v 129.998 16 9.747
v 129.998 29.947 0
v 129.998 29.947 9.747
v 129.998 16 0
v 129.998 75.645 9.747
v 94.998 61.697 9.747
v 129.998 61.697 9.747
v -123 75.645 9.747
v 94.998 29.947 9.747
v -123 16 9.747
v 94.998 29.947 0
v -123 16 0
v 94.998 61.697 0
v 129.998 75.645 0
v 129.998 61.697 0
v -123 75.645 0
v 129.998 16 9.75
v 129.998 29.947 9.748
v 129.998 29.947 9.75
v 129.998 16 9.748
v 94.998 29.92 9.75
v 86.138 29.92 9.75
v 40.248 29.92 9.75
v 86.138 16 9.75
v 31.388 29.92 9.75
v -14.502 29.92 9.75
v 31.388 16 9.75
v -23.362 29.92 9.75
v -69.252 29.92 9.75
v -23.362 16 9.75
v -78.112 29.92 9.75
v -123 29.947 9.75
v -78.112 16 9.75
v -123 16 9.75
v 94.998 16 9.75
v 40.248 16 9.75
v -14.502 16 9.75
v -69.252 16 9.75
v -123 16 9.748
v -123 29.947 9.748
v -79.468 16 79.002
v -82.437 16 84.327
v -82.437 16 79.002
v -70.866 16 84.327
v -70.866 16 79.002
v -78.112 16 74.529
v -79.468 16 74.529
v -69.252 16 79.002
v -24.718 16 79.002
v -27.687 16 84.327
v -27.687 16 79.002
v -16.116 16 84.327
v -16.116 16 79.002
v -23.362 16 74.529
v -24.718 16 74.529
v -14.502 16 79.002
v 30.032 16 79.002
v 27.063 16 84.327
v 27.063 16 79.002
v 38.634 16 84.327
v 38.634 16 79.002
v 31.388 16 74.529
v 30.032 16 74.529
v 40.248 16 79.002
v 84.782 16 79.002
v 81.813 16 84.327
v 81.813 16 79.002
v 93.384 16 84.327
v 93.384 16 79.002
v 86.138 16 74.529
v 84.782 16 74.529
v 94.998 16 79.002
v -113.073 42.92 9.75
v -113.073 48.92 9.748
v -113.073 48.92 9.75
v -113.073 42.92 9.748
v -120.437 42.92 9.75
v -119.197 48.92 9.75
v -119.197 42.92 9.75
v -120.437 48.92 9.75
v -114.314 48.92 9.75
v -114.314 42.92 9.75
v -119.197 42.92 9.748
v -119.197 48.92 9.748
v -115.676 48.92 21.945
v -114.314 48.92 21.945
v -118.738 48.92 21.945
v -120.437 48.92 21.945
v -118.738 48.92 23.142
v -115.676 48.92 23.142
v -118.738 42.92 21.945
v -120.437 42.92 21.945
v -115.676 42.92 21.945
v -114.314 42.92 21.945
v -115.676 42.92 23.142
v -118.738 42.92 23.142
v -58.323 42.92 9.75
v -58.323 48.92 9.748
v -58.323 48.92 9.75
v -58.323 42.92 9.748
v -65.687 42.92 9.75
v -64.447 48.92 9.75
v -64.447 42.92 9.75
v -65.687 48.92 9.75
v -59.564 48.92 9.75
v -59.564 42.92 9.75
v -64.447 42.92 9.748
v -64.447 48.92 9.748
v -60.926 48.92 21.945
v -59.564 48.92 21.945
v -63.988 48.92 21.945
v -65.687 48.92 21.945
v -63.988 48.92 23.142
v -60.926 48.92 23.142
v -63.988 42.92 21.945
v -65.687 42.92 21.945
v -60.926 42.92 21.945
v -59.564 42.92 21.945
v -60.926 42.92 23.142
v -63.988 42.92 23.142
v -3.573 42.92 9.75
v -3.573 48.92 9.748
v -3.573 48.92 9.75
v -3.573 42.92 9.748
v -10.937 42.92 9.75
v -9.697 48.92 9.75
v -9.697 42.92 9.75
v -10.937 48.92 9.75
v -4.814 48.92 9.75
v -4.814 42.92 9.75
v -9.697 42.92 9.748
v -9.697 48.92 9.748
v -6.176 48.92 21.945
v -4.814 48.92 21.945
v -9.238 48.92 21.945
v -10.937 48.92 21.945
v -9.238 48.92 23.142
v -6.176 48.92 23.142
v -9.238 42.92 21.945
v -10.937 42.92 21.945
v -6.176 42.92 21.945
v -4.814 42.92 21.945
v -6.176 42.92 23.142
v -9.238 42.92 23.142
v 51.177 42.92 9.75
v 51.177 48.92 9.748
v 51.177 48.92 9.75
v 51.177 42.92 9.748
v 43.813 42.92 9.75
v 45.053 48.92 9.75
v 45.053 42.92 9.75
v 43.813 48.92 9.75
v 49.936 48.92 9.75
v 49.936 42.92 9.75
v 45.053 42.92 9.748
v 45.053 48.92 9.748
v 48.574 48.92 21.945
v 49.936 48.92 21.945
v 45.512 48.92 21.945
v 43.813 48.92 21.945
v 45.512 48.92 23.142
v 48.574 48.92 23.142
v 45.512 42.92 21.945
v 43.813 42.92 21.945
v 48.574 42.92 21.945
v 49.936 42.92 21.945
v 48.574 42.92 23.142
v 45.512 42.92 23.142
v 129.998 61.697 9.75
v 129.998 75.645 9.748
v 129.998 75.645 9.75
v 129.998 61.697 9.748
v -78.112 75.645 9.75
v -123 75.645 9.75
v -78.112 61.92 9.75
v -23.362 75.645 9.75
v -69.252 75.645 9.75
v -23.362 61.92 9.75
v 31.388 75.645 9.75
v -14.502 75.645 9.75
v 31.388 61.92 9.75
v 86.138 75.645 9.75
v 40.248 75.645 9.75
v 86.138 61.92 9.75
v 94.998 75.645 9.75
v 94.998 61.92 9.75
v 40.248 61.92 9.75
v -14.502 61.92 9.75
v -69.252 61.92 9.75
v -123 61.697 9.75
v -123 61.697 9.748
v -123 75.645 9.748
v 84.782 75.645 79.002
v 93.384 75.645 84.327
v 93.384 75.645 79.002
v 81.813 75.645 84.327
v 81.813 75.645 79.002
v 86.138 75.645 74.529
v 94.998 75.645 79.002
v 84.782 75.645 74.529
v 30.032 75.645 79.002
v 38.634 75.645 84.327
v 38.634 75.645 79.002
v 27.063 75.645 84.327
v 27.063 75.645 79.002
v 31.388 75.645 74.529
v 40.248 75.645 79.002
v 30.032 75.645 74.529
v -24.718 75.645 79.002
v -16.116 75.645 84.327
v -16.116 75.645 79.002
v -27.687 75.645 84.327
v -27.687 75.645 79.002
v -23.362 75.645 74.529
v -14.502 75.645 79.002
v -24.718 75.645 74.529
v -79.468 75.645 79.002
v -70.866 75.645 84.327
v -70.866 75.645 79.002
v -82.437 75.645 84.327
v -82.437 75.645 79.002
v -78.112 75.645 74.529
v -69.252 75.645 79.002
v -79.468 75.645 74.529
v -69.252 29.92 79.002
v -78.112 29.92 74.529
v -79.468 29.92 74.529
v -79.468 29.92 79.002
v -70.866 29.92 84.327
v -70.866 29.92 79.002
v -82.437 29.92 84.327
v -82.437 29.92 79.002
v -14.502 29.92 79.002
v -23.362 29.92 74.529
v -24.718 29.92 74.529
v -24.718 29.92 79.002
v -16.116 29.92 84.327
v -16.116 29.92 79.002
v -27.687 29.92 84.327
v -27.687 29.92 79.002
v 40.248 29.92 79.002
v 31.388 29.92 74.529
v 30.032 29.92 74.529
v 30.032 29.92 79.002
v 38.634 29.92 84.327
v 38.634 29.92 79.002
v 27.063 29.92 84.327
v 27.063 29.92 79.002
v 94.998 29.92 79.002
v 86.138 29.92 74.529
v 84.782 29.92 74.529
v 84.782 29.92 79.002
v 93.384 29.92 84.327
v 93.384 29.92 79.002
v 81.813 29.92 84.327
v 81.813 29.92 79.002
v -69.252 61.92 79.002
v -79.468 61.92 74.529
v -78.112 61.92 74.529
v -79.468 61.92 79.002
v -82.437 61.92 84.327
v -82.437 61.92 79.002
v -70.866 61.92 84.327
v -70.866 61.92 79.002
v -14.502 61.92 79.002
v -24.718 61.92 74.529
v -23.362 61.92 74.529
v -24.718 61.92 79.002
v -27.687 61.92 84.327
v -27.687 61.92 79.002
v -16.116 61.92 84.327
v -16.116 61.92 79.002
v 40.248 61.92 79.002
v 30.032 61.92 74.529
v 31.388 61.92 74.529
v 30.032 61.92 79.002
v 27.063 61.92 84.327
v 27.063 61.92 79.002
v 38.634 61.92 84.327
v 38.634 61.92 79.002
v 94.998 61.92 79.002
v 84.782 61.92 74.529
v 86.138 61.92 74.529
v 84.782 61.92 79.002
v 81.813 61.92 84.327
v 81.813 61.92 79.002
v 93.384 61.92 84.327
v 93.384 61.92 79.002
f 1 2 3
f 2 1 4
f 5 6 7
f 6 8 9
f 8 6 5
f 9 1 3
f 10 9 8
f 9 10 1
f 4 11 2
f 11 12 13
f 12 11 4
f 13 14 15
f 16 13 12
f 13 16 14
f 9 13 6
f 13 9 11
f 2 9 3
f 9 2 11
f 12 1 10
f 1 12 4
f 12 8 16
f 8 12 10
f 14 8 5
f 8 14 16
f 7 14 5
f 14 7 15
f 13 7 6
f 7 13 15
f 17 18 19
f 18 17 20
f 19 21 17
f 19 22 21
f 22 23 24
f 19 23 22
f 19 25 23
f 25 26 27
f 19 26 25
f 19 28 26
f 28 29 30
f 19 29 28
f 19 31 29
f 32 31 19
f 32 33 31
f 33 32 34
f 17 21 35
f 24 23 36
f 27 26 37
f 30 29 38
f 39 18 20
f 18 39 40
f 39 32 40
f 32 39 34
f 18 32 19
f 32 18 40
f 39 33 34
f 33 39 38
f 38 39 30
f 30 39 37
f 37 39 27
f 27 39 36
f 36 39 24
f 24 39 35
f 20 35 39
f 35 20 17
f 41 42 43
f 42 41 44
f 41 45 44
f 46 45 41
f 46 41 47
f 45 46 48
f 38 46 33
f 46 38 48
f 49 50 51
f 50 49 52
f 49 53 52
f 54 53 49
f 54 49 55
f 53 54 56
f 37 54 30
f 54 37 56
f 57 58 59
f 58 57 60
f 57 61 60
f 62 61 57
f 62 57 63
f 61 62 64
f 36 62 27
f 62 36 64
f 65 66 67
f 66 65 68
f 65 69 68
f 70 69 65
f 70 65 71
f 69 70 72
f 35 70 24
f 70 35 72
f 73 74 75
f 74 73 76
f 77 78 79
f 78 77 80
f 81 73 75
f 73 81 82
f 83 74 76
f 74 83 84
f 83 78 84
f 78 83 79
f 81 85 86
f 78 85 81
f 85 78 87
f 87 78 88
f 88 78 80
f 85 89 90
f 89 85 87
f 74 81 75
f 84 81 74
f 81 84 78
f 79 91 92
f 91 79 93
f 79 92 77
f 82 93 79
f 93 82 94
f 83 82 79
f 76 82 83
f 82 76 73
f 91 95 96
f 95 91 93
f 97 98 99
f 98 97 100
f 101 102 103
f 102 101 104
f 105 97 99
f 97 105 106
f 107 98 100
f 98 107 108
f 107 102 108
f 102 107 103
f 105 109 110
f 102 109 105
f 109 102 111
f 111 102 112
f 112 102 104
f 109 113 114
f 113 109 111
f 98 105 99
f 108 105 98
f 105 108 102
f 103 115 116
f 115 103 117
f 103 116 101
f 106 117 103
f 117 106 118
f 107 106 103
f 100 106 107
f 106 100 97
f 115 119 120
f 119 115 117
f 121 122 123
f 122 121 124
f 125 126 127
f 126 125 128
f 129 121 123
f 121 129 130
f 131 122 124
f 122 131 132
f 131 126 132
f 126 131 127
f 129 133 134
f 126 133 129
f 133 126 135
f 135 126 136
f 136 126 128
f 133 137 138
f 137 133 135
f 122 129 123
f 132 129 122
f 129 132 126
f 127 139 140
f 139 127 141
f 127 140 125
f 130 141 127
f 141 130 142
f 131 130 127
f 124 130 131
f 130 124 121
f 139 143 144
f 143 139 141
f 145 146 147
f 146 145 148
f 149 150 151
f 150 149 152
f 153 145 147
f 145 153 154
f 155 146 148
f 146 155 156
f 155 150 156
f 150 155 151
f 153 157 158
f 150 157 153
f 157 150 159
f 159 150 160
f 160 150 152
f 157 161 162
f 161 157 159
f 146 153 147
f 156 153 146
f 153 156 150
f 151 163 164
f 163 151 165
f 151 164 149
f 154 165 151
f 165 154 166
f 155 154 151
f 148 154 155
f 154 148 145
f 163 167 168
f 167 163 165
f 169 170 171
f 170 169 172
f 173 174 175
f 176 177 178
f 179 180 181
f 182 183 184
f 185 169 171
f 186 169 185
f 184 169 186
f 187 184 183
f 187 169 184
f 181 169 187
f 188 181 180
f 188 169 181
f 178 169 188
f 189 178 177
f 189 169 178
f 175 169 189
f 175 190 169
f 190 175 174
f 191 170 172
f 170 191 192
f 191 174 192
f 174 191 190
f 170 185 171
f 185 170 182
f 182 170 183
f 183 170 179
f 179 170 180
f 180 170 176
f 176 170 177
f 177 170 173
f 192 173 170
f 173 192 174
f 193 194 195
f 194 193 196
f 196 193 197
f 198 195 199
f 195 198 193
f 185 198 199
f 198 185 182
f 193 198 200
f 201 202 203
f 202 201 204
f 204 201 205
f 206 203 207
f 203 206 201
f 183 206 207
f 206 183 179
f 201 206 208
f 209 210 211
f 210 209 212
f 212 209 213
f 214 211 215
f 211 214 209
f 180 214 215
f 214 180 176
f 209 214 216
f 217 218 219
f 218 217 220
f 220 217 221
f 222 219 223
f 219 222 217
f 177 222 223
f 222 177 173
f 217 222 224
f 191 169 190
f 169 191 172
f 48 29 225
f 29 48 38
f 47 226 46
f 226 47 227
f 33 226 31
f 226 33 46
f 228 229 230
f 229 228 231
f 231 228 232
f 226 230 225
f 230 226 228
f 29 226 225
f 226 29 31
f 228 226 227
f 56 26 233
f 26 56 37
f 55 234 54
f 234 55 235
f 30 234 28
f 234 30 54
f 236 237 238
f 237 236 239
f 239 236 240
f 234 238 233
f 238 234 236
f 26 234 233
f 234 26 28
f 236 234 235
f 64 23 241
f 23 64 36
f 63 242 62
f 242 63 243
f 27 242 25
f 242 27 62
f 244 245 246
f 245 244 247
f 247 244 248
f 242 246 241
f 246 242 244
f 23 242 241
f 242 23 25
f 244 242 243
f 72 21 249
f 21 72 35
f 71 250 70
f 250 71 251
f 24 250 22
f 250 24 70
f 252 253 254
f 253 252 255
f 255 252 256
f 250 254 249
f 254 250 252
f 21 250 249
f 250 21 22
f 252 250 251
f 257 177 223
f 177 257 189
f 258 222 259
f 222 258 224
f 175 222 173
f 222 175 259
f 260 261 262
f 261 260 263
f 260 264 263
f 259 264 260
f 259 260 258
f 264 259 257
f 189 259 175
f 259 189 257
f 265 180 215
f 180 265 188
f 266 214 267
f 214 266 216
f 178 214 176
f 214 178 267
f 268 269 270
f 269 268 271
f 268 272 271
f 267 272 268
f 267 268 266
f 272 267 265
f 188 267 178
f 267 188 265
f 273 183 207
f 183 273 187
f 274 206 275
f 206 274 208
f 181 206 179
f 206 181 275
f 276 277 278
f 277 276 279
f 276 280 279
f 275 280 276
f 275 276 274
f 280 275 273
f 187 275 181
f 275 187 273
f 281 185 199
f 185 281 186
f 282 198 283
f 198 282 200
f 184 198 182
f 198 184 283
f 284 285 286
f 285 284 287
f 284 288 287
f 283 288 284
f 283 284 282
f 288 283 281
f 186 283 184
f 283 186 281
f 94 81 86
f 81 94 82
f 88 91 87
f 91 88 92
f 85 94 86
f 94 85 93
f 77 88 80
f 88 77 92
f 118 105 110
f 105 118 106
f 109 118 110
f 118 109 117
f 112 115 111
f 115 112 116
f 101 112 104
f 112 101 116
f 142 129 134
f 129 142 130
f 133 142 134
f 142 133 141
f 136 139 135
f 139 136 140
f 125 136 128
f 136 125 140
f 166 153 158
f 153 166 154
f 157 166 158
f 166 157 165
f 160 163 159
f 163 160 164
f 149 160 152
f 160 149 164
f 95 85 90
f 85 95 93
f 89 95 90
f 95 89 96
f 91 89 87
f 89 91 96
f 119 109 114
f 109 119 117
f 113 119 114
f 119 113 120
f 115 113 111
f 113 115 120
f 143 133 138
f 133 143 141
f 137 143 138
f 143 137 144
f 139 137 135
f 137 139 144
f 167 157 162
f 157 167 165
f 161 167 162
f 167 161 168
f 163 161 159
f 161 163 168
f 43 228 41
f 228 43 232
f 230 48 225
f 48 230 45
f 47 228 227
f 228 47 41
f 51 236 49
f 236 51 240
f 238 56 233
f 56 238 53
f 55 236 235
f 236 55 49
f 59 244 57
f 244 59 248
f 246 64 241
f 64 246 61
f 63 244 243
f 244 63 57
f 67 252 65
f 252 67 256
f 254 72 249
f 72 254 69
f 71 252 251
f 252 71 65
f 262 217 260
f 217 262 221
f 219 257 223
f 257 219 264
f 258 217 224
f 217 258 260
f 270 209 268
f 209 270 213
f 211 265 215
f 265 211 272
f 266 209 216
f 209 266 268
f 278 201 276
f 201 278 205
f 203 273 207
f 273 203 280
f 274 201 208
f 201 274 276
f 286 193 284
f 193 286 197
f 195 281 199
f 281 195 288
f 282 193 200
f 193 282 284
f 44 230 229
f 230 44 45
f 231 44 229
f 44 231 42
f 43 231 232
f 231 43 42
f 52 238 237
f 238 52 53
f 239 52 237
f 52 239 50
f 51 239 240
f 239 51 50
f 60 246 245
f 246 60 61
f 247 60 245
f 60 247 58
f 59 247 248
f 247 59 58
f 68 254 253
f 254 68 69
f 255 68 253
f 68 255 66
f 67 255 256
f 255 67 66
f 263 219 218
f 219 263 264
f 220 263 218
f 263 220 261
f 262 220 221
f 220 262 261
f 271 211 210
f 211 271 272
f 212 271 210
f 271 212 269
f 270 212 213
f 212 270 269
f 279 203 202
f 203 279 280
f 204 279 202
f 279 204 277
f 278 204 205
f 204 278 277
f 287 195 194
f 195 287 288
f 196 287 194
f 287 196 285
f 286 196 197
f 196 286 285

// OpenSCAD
// Rewritten from layered polygon rebuild into rectilinear cubes
// Each slab is decomposed into axis-aligned rectangles and emitted as cubes.
// Note: This preserves orthogonal geometry; curved/diagonal features (if any) are approximated.

module rect_prism(x1,y1,x2,y2,z0,h){
  translate([x1,y1,z0]) cube([x2-x1, y2-y1, h], center=false);
}

module slab_1() {
  union() {
    rect_prism(94.997986,15.999999,129.997986,29.946999,0,9.747);
    rect_prism(-123.000008,15.999999,94.997986,75.644997,0,9.747);
    rect_prism(94.997986,61.696999,129.997986,75.644997,0,9.747);
  }
}

module slab_2() {
  union() {
    rect_prism(-123.000008,15.999999,129.997986,29.946999,9.748,0.002);
    rect_prism(-119.196615,42.919998,-113.073431,48.919998,9.748,0.002);
    rect_prism(-64.44663,42.919998,-58.323427,48.919998,9.748,0.002);
    rect_prism(-9.696628,42.919998,-3.573428,48.919998,9.748,0.002);
    rect_prism(45.053381,42.919998,51.176573,48.919998,9.748,0.002);
    rect_prism(-123.000008,61.696999,129.997986,75.644997,9.748,0.002);
  }
}

module slab_3_4_5() {
  // Consolidated: slabs 3, 4, and 5 were contiguous in Z and largely repeated.
  // This version merges the eight vertical posts into single prisms and keeps the two brace bands.
  union() {
    // Vertical posts (merged height: 64.779)
    rect_prism(-78.112015,15.999999,-69.252014,29.919998,9.750000,64.779000);
    rect_prism(-23.362015,15.999999,-14.502014,29.919998,9.750000,64.779000);
    rect_prism(31.387985,15.999999,40.247986,29.919998,9.750000,64.779000);
    rect_prism(86.137985,15.999999,94.997986,29.919998,9.750000,64.779000);
    rect_prism(-78.112015,61.919998,-69.252014,75.644997,9.750000,64.779000);
    rect_prism(-23.362015,61.919998,-14.502014,75.644997,9.750000,64.779000);
    rect_prism(31.387985,61.919998,40.247986,75.644997,9.750000,64.779000);
    rect_prism(86.137985,61.919998,94.997986,75.644997,9.750000,64.779000);

    // Lower brace band (wider)
    rect_prism(-120.437410,42.919998,-114.314075,48.919998,9.750000,12.195000);
    rect_prism(-65.687418,42.919998,-59.564071,48.919998,9.750000,12.195000);
    rect_prism(-10.937418,42.919998,-4.814072,48.919998,9.750000,12.195000);
    rect_prism(43.812582,42.919998,49.935932,48.919998,9.750000,12.195000);

    // Upper thin brace band (narrower)
    rect_prism(-118.738005,42.919998,-115.676272,48.919998,21.945000,1.197000);
    rect_prism(-63.988003,42.919998,-60.926268,48.919998,21.945000,1.197000);
    rect_prism(-9.238005,42.919998,-6.176269,48.919998,21.945000,1.197000);
    rect_prism(45.511995,42.919998,48.573739,48.919998,21.945000,1.197000);
  }
}




module slab_6() {
  union() {
    rect_prism(-79.467536,15.999999,-69.252014,29.919998,74.529,4.4726);
    rect_prism(-24.717536,15.999999,-14.502014,29.919998,74.529,4.4726);
    rect_prism(30.032464,15.999999,40.247986,29.919998,74.529,4.4726);
    rect_prism(84.782464,15.999999,94.997986,29.919998,74.529,4.4726);
    rect_prism(-79.467536,61.919998,-69.252014,75.644997,74.529,4.4726);
    rect_prism(-24.717536,61.919998,-14.502014,75.644997,74.529,4.4726);
    rect_prism(30.032464,61.919998,40.247986,75.644997,74.529,4.4726);
    rect_prism(84.782464,61.919998,94.997986,75.644997,74.529,4.4726);
  }
}

module slab_7() {
  union() {
    rect_prism(-82.437039,15.999999,-70.865755,29.919998,79.0016,5.3254);
    rect_prism(-27.687036,15.999999,-16.115755,29.919998,79.0016,5.3254);
    rect_prism(27.062964,15.999999,38.634246,29.919998,79.0016,5.3254);
    rect_prism(81.812961,15.999999,93.384242,29.919998,79.0016,5.3254);
    rect_prism(-82.437039,61.919998,-70.865755,75.644997,79.0016,5.3254);
    rect_prism(-27.687036,61.919998,-16.115755,75.644997,79.0016,5.3254);
    rect_prism(27.062964,61.919998,38.634246,75.644997,79.0016,5.3254);
    rect_prism(81.812961,61.919998,93.384242,75.644997,79.0016,5.3254);
  }
}

module top() {
  union() {
    slab_1();
    slab_2();    slab_3_4_5();
    slab_6();
    slab_7();
  }
}

top();
